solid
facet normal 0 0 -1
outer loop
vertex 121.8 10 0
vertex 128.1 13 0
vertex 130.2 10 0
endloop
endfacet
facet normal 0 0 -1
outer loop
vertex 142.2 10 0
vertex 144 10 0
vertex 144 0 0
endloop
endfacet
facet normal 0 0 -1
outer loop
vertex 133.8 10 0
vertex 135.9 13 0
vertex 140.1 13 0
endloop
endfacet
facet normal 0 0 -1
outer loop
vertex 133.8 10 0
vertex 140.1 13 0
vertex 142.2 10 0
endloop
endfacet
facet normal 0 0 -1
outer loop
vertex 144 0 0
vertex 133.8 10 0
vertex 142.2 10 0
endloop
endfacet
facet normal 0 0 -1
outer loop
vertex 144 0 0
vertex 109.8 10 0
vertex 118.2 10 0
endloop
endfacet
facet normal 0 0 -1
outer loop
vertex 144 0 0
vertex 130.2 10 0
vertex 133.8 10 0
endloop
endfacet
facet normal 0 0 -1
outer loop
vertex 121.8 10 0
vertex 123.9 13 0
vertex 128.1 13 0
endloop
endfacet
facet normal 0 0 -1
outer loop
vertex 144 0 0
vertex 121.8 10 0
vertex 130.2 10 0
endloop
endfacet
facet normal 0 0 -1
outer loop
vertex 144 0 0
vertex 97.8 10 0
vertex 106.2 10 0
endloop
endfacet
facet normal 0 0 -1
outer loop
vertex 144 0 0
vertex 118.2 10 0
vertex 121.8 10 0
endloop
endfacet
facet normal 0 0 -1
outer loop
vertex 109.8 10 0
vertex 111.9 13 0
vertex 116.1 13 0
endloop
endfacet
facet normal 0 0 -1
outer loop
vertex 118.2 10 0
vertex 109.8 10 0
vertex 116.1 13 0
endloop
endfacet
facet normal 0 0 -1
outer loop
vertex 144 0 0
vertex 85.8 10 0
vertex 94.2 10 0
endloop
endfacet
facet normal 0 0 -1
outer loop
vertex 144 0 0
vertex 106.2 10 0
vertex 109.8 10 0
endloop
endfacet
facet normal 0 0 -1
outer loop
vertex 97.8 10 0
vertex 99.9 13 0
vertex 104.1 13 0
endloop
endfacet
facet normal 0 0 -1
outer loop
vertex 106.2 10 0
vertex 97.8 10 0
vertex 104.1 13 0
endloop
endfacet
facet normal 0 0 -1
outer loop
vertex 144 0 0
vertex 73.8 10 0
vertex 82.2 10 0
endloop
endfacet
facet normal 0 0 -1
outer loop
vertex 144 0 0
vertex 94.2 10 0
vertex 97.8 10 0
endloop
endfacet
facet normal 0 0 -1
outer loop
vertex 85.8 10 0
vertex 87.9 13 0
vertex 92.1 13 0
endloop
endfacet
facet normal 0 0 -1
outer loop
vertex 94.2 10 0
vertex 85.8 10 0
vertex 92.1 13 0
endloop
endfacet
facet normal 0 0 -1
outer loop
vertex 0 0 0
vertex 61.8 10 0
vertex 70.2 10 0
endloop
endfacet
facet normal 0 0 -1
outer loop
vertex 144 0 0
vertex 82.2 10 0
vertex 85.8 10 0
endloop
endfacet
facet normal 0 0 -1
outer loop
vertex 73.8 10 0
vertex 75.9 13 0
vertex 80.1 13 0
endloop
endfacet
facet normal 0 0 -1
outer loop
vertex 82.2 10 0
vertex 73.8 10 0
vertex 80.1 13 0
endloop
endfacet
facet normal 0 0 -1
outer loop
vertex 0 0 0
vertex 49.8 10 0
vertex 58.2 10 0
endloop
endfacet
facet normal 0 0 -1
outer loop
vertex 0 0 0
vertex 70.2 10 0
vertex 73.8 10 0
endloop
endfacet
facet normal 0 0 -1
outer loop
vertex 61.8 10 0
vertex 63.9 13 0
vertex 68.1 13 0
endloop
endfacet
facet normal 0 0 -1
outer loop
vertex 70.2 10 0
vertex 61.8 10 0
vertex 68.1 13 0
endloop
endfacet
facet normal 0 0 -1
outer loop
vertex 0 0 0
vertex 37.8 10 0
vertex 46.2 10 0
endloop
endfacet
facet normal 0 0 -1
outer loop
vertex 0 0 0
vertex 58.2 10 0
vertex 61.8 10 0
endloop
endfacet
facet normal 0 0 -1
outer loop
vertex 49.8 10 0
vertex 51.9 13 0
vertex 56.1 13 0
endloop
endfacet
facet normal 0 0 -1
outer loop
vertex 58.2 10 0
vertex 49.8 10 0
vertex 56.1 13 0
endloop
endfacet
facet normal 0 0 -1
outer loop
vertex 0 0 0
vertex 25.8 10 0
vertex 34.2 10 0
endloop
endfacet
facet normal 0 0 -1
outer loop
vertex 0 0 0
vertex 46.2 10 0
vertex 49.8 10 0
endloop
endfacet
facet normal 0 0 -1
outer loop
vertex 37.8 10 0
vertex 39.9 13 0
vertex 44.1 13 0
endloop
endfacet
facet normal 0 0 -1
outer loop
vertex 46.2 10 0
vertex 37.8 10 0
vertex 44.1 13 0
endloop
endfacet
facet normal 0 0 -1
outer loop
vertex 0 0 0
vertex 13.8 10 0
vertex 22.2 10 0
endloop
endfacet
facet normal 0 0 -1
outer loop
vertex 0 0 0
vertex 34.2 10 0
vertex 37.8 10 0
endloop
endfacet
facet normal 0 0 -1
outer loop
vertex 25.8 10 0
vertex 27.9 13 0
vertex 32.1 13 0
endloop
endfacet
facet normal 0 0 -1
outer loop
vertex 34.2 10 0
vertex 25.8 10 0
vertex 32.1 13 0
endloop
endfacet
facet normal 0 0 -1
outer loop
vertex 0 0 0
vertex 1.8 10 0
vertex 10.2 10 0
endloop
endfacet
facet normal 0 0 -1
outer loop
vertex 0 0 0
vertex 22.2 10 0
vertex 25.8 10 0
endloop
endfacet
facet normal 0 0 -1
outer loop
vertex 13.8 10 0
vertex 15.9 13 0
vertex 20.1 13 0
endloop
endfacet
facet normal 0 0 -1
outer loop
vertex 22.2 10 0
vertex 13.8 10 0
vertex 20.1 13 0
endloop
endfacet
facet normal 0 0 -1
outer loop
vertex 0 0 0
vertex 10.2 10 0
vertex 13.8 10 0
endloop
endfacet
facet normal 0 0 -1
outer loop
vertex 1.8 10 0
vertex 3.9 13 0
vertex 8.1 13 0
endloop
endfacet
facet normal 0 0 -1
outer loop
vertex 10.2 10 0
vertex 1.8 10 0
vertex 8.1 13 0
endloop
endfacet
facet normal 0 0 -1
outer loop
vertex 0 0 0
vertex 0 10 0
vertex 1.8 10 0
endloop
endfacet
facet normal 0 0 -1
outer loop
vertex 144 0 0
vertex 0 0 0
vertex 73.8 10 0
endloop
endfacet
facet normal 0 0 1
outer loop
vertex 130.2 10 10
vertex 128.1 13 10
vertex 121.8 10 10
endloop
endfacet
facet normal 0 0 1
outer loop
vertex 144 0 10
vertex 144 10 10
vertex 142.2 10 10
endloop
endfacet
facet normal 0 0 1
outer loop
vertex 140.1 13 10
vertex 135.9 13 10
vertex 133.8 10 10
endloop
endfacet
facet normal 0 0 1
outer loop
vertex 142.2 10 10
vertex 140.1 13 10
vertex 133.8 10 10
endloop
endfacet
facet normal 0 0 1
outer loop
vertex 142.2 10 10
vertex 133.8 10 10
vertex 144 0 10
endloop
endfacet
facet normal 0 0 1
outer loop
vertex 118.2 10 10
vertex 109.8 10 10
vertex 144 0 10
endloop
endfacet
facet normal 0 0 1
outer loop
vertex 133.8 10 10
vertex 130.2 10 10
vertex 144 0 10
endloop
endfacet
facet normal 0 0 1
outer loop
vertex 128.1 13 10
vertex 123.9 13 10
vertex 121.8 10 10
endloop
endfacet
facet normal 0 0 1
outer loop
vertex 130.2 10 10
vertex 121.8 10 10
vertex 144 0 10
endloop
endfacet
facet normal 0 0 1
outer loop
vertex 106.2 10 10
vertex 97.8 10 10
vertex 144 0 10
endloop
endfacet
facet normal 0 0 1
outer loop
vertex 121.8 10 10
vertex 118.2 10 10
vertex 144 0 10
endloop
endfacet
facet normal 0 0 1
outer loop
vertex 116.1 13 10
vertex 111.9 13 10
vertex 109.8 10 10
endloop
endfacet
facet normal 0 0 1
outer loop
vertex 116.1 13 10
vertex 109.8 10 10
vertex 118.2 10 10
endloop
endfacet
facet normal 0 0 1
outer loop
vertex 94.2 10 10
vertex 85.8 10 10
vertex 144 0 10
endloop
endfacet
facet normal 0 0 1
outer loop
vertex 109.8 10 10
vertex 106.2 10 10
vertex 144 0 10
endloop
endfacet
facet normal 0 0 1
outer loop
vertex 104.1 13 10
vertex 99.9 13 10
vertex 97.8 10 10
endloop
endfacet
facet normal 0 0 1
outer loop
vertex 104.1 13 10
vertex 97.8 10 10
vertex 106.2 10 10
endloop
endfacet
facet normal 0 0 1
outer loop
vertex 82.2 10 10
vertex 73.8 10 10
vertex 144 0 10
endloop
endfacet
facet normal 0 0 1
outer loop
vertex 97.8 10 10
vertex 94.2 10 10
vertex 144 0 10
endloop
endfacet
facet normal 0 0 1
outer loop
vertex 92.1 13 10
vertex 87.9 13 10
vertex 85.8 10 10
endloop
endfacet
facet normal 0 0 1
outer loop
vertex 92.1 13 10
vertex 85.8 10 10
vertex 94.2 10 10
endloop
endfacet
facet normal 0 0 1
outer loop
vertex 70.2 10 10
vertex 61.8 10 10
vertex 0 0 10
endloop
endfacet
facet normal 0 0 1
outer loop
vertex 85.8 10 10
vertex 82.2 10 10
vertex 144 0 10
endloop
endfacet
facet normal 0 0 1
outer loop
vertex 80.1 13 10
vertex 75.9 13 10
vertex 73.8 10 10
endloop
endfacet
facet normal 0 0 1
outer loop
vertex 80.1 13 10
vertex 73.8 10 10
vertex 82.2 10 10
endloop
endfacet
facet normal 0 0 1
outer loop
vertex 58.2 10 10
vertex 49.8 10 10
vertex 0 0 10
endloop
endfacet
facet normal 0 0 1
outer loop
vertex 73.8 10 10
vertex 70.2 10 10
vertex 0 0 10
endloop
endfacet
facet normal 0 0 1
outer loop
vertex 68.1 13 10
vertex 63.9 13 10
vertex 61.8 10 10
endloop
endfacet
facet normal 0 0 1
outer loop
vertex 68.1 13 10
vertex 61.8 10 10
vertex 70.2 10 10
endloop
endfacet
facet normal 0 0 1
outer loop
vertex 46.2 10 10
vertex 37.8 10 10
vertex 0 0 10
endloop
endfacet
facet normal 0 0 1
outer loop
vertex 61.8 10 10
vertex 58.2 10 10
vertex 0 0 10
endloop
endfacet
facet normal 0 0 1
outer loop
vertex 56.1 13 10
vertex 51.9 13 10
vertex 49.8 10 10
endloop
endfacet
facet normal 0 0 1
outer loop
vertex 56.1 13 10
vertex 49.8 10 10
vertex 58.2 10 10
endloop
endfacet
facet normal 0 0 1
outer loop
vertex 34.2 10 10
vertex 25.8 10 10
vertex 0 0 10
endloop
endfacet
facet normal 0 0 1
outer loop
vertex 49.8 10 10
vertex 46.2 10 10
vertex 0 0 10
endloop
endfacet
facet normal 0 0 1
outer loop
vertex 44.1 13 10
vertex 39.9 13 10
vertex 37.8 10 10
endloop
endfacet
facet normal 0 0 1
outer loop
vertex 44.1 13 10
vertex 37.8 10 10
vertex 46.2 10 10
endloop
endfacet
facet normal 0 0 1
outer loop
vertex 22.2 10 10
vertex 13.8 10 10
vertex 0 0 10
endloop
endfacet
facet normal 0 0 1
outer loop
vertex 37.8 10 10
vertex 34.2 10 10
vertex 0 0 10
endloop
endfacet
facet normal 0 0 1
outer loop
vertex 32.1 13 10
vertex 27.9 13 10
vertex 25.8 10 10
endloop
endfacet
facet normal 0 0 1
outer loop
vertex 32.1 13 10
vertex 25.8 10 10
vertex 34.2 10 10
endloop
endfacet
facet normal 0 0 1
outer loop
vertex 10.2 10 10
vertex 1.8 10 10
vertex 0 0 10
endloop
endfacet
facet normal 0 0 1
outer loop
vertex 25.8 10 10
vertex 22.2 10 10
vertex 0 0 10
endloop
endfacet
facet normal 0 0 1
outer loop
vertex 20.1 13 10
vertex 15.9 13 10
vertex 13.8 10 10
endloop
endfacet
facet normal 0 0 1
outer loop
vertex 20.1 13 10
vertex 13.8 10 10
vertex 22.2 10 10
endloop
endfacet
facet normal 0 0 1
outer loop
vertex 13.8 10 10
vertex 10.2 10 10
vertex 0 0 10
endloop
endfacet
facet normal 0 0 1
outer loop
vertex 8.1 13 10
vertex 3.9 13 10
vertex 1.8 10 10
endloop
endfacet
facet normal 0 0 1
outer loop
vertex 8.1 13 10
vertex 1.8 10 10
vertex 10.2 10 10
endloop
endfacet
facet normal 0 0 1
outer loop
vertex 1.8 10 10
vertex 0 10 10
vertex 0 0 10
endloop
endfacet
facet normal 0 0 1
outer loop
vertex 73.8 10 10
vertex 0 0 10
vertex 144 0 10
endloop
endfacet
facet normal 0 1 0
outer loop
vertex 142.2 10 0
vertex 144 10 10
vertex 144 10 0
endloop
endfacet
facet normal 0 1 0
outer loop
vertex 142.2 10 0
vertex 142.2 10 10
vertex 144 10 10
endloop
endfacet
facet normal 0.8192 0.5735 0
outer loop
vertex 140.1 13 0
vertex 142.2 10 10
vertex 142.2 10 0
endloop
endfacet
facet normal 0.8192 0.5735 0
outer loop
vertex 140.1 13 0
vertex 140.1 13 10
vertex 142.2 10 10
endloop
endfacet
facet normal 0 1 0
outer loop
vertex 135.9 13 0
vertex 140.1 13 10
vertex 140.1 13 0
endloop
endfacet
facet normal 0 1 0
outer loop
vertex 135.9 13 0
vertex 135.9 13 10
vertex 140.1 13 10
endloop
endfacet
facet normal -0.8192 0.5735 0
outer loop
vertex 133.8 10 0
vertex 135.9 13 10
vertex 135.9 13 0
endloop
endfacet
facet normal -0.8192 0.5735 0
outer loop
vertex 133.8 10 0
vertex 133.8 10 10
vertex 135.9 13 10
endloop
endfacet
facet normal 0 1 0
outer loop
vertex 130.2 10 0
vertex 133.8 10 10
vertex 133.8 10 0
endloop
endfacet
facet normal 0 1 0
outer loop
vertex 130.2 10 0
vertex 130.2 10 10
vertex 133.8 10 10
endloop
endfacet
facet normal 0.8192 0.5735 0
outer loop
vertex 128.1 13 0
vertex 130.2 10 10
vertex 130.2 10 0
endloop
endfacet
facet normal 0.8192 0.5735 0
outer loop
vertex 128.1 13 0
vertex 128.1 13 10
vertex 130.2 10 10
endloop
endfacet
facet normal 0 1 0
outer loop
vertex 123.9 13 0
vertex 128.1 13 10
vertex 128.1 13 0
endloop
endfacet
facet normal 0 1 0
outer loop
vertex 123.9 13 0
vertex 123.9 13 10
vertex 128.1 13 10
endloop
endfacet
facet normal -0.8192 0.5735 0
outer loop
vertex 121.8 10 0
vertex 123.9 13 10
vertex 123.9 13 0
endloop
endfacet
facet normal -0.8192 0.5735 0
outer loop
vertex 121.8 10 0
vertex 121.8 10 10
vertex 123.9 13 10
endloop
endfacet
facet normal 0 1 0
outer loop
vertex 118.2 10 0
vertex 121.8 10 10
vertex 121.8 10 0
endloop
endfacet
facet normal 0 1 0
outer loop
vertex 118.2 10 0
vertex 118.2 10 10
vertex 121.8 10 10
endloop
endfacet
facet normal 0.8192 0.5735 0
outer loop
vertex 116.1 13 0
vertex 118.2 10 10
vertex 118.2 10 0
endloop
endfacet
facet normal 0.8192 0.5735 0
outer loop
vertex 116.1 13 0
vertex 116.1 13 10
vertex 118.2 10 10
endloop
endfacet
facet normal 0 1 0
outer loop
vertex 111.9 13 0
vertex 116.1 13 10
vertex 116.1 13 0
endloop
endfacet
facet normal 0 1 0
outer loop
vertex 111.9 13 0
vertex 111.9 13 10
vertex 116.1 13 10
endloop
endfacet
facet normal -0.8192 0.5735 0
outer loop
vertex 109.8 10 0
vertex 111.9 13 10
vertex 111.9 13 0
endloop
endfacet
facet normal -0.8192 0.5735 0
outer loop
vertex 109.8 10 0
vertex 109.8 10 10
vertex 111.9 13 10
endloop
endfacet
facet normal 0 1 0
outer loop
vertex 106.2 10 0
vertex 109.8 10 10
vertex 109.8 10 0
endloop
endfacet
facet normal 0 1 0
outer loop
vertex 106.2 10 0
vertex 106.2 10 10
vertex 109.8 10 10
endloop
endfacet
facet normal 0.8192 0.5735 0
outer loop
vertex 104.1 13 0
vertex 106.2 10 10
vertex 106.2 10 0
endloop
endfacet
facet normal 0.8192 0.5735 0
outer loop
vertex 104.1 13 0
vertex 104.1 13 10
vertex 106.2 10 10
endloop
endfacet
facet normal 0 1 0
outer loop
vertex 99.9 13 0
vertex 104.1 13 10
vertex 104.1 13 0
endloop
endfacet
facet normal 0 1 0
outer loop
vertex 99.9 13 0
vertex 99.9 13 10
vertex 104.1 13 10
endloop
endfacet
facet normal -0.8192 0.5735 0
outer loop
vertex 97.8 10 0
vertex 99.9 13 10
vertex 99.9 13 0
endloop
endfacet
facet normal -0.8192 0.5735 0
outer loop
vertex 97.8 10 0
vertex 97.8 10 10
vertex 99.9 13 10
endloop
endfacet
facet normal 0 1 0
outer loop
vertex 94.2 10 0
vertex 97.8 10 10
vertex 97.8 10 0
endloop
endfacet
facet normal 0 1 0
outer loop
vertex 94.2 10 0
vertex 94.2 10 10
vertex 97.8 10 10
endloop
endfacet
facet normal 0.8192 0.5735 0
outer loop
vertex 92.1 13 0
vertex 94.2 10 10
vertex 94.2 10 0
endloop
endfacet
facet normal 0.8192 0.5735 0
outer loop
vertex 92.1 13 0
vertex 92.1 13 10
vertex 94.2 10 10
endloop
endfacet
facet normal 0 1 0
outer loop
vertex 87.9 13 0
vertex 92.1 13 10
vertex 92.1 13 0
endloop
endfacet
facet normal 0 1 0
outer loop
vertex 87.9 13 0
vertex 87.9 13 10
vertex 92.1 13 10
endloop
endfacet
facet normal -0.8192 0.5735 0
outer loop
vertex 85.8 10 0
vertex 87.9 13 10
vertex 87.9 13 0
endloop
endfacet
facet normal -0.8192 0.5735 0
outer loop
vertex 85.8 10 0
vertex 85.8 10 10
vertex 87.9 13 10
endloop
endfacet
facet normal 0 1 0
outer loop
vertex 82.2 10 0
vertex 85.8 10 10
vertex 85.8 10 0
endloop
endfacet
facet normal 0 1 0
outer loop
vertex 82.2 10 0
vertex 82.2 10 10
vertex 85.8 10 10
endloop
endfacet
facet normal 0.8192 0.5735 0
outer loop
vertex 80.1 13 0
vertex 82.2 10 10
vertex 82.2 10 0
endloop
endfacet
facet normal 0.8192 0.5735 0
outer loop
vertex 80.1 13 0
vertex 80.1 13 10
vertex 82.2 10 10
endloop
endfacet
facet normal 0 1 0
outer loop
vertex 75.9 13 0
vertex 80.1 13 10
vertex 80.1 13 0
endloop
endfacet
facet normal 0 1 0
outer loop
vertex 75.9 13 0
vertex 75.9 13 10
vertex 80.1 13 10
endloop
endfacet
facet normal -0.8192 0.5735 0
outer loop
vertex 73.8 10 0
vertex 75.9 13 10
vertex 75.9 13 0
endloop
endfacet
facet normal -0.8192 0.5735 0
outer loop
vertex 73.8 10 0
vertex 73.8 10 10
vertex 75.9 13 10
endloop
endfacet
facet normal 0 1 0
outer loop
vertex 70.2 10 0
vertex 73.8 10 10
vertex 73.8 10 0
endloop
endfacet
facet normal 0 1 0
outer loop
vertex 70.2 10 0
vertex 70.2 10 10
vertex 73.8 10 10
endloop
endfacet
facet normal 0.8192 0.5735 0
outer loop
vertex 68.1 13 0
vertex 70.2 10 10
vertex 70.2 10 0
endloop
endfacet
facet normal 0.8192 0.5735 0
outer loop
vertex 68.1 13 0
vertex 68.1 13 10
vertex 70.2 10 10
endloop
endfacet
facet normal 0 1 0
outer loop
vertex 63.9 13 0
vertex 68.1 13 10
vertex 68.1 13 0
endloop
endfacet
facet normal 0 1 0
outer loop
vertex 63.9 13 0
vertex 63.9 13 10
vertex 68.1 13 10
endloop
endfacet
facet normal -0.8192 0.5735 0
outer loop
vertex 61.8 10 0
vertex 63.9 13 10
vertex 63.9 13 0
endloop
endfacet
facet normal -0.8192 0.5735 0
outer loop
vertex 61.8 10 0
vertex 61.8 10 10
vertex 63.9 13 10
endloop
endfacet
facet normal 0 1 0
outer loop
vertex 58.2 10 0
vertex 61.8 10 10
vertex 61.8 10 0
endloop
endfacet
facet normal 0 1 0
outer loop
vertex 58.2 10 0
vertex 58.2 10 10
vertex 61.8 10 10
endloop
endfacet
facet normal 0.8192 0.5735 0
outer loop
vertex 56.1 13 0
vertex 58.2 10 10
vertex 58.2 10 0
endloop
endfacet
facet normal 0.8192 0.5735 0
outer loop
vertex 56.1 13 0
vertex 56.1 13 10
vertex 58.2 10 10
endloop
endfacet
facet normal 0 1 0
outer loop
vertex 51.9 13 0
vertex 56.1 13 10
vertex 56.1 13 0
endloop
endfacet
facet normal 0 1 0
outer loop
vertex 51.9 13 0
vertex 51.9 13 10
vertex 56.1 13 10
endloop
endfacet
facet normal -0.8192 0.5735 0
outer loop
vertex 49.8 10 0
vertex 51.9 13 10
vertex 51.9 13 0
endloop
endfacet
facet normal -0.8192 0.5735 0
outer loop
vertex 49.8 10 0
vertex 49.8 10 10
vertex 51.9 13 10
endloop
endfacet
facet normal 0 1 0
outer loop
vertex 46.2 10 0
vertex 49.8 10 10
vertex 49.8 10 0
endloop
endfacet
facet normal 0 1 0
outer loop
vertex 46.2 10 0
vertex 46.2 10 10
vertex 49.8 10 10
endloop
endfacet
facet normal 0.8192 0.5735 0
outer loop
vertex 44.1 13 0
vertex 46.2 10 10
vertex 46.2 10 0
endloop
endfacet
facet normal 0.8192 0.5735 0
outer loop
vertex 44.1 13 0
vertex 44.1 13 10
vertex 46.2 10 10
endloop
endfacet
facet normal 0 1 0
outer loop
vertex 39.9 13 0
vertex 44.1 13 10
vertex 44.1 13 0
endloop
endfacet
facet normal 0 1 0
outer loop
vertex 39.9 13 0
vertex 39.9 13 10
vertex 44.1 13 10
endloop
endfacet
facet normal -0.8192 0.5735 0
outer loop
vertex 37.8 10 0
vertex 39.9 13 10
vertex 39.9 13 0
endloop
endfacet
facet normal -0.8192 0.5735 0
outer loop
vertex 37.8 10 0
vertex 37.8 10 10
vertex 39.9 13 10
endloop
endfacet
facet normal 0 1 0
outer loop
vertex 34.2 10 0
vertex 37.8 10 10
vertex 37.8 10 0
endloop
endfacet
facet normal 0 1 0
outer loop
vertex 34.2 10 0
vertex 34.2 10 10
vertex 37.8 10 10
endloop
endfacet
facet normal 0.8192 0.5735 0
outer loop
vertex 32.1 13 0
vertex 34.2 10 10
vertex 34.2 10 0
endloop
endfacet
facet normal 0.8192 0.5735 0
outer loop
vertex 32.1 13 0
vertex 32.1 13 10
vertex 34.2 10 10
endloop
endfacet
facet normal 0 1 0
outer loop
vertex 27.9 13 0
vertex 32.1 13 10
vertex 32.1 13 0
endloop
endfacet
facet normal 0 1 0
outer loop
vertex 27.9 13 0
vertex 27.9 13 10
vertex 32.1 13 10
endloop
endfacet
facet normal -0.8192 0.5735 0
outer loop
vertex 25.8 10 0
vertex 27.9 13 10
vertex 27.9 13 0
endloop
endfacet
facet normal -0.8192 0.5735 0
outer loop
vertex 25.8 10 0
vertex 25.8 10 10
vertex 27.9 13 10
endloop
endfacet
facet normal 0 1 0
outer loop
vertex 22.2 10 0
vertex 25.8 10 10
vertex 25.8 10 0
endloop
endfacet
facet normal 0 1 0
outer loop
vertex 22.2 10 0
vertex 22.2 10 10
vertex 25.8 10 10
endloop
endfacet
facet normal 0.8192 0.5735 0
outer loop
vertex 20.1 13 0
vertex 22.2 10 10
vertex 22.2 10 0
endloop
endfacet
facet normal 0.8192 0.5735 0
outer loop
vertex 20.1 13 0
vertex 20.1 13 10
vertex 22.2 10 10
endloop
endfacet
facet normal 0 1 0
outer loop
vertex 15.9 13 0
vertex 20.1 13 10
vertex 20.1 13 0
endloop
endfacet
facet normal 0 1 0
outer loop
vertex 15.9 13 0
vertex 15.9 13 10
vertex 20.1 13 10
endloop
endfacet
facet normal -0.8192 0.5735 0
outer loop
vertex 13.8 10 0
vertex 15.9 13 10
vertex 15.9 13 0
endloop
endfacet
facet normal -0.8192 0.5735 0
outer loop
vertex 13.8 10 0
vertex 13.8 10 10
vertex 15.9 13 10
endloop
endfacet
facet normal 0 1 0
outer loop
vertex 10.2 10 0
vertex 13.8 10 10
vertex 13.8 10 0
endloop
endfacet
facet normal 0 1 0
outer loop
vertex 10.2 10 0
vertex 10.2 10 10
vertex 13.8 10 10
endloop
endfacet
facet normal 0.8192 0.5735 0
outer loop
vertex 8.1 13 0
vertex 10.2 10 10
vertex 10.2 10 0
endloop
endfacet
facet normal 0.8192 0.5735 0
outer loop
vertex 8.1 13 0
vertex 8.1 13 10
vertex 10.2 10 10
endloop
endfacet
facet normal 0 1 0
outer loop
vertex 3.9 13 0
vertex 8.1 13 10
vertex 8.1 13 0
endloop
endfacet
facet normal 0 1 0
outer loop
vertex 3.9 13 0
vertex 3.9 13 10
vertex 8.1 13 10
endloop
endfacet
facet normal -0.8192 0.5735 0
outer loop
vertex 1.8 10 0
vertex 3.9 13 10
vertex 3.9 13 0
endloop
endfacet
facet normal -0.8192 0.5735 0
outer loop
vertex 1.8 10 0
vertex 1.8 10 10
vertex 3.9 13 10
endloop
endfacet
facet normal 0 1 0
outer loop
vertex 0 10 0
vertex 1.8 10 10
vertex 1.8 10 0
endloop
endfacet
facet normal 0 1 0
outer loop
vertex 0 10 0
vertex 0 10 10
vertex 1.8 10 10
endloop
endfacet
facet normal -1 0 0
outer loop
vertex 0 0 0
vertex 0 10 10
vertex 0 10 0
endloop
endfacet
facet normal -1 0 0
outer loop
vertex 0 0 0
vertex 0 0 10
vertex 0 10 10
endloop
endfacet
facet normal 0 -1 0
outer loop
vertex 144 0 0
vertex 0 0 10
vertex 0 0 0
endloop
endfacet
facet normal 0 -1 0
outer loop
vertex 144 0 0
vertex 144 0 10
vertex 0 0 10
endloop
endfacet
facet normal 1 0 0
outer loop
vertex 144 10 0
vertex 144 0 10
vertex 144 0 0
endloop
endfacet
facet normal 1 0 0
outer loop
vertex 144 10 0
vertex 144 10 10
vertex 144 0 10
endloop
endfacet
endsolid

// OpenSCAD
$fn = 32;

// ----------------------------------------------------------------------
// Gear rack: 12 teeth, pitch 12 mm
// ----------------------------------------------------------------------

// --- parameters (mm) ---
teeth = 12;               // number of teeth
pitch = 12;               // tooth pitch, X
root_w = 8.4;             // tooth width at the root
tip_w = 4.2;              // tooth width at the tip
base_h = 10;              // rack body height, Y
tooth_h = 3;              // tooth height above the body
plate_t = 10;             // rack width, Z (extrusion height)

rack_l = teeth * pitch;  // overall length
total_h = base_h + tooth_h;  // overall height

profile = [[0, 0], [144, 0], [144, 10], [142.2, 10], [140.1, 13], [135.9, 13], [133.8, 10], [130.2, 10], [128.1, 13], [123.9, 13], [121.8, 10], [118.2, 10], [116.1, 13], [111.9, 13], [109.8, 10], [106.2, 10], [104.1, 13], [99.9, 13], [97.8, 10], [94.2, 10], [92.1, 13], [87.9, 13], [85.8, 10], [82.2, 10], [80.1, 13], [75.9, 13], [73.8, 10], [70.2, 10], [68.1, 13], [63.9, 13], [61.8, 10], [58.2, 10], [56.1, 13], [51.9, 13], [49.8, 10], [46.2, 10], [44.1, 13], [39.9, 13], [37.8, 10], [34.2, 10], [32.1, 13], [27.9, 13], [25.8, 10], [22.2, 10], [20.1, 13], [15.9, 13], [13.8, 10], [10.2, 10], [8.1, 13], [3.9, 13], [1.8, 10], [0, 10]];  // primary outline, 52 points, counter clockwise

// --- the one profile operation ---
linear_extrude(height = plate_t) polygon(points = profile);
